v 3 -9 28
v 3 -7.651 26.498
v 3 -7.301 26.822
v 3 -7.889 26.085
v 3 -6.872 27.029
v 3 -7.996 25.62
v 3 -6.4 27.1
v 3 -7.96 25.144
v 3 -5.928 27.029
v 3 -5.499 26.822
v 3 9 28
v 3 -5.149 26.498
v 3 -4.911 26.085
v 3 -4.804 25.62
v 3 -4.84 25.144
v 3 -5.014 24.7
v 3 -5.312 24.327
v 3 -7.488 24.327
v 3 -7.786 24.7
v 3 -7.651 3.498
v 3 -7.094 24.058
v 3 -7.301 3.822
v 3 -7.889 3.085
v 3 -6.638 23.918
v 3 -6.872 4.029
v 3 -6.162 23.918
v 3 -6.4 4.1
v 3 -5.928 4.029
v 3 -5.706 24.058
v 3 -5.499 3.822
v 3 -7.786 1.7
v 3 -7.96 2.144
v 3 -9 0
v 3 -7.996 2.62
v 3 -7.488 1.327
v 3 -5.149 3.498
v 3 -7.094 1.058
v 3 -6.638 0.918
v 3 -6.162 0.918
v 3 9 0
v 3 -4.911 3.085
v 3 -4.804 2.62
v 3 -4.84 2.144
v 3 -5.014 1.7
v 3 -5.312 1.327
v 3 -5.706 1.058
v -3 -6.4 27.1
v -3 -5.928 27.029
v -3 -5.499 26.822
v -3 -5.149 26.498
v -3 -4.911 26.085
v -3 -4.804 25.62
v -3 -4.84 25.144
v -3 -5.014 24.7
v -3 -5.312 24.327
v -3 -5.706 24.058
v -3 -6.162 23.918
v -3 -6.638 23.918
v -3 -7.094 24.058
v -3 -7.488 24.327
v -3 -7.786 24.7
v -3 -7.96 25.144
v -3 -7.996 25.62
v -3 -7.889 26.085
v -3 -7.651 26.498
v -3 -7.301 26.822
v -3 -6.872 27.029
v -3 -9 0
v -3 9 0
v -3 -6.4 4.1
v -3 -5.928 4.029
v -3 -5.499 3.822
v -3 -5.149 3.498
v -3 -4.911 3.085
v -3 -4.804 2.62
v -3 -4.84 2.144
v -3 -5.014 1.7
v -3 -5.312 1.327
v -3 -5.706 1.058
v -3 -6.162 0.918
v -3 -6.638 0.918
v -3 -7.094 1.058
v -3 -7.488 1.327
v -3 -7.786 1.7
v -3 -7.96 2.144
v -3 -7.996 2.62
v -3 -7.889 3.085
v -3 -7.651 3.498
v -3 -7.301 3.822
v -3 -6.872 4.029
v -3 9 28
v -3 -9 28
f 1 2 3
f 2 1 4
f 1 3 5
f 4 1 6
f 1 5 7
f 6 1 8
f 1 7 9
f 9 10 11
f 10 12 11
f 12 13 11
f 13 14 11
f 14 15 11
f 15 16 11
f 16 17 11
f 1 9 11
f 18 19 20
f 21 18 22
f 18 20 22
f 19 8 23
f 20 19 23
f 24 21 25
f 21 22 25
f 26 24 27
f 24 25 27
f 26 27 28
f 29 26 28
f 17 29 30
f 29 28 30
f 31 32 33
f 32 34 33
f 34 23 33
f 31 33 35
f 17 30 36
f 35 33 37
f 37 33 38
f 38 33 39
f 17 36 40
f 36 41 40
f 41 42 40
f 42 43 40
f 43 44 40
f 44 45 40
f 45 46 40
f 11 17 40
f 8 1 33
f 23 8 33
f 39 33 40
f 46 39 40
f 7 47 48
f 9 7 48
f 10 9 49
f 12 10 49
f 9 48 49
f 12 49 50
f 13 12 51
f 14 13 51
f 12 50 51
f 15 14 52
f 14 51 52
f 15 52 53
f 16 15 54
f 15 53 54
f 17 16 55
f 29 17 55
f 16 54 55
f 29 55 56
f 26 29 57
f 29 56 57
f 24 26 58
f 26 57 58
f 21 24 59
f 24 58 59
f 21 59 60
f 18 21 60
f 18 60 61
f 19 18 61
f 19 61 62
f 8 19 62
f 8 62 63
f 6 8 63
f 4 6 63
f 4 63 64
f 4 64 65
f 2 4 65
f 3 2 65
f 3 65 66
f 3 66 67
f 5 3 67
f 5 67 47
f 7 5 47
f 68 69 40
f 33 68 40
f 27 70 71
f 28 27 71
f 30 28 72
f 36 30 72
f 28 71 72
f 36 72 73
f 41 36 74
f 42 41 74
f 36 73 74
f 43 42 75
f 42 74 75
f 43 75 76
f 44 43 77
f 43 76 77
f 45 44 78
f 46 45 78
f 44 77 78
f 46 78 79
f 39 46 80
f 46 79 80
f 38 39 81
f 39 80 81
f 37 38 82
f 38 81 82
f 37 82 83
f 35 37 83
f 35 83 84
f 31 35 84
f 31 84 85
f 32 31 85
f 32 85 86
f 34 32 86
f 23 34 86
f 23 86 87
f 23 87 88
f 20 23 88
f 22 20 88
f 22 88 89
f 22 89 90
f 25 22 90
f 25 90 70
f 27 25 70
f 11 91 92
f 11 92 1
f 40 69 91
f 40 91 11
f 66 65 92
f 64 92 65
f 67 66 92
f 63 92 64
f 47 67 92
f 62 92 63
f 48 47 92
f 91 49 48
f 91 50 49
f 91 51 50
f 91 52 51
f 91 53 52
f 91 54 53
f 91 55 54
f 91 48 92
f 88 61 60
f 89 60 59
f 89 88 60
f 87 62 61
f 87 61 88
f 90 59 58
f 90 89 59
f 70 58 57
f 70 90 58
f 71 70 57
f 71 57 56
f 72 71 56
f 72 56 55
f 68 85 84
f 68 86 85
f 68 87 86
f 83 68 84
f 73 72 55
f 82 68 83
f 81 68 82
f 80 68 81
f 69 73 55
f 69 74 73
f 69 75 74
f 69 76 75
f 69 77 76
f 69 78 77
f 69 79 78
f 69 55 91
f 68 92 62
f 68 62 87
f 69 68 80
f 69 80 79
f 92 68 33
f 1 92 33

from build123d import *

# Parameters (mm, degrees)
ESQUISSE1_W             = 6
ESQUISSE1_H             = 18
BOSS_EXTRU_1_DEPTH      = 28
ESQUISSE2_R             = 1.6
ENL_V_MAT_EXTRU_1_DEPTH = 28


with BuildPart() as part:
    # Esquisse1 → Boss.-Extru.1 (new body)
    with BuildSketch(Plane.XY):
        Rectangle(ESQUISSE1_W, ESQUISSE1_H)
    extrude(amount=BOSS_EXTRU_1_DEPTH)

    # Esquisse2 → Enlèv. mat.-Extru.1 (cut)
    with BuildSketch(Plane.ZY.offset(3)):
        with Locations((2.5, -6.4)):
            Circle(ESQUISSE2_R)
        with Locations((25.5, -6.4)):
            Circle(ESQUISSE2_R)
    extrude(amount=-ENL_V_MAT_EXTRU_1_DEPTH, mode=Mode.SUBTRACT)


solid = part.part
